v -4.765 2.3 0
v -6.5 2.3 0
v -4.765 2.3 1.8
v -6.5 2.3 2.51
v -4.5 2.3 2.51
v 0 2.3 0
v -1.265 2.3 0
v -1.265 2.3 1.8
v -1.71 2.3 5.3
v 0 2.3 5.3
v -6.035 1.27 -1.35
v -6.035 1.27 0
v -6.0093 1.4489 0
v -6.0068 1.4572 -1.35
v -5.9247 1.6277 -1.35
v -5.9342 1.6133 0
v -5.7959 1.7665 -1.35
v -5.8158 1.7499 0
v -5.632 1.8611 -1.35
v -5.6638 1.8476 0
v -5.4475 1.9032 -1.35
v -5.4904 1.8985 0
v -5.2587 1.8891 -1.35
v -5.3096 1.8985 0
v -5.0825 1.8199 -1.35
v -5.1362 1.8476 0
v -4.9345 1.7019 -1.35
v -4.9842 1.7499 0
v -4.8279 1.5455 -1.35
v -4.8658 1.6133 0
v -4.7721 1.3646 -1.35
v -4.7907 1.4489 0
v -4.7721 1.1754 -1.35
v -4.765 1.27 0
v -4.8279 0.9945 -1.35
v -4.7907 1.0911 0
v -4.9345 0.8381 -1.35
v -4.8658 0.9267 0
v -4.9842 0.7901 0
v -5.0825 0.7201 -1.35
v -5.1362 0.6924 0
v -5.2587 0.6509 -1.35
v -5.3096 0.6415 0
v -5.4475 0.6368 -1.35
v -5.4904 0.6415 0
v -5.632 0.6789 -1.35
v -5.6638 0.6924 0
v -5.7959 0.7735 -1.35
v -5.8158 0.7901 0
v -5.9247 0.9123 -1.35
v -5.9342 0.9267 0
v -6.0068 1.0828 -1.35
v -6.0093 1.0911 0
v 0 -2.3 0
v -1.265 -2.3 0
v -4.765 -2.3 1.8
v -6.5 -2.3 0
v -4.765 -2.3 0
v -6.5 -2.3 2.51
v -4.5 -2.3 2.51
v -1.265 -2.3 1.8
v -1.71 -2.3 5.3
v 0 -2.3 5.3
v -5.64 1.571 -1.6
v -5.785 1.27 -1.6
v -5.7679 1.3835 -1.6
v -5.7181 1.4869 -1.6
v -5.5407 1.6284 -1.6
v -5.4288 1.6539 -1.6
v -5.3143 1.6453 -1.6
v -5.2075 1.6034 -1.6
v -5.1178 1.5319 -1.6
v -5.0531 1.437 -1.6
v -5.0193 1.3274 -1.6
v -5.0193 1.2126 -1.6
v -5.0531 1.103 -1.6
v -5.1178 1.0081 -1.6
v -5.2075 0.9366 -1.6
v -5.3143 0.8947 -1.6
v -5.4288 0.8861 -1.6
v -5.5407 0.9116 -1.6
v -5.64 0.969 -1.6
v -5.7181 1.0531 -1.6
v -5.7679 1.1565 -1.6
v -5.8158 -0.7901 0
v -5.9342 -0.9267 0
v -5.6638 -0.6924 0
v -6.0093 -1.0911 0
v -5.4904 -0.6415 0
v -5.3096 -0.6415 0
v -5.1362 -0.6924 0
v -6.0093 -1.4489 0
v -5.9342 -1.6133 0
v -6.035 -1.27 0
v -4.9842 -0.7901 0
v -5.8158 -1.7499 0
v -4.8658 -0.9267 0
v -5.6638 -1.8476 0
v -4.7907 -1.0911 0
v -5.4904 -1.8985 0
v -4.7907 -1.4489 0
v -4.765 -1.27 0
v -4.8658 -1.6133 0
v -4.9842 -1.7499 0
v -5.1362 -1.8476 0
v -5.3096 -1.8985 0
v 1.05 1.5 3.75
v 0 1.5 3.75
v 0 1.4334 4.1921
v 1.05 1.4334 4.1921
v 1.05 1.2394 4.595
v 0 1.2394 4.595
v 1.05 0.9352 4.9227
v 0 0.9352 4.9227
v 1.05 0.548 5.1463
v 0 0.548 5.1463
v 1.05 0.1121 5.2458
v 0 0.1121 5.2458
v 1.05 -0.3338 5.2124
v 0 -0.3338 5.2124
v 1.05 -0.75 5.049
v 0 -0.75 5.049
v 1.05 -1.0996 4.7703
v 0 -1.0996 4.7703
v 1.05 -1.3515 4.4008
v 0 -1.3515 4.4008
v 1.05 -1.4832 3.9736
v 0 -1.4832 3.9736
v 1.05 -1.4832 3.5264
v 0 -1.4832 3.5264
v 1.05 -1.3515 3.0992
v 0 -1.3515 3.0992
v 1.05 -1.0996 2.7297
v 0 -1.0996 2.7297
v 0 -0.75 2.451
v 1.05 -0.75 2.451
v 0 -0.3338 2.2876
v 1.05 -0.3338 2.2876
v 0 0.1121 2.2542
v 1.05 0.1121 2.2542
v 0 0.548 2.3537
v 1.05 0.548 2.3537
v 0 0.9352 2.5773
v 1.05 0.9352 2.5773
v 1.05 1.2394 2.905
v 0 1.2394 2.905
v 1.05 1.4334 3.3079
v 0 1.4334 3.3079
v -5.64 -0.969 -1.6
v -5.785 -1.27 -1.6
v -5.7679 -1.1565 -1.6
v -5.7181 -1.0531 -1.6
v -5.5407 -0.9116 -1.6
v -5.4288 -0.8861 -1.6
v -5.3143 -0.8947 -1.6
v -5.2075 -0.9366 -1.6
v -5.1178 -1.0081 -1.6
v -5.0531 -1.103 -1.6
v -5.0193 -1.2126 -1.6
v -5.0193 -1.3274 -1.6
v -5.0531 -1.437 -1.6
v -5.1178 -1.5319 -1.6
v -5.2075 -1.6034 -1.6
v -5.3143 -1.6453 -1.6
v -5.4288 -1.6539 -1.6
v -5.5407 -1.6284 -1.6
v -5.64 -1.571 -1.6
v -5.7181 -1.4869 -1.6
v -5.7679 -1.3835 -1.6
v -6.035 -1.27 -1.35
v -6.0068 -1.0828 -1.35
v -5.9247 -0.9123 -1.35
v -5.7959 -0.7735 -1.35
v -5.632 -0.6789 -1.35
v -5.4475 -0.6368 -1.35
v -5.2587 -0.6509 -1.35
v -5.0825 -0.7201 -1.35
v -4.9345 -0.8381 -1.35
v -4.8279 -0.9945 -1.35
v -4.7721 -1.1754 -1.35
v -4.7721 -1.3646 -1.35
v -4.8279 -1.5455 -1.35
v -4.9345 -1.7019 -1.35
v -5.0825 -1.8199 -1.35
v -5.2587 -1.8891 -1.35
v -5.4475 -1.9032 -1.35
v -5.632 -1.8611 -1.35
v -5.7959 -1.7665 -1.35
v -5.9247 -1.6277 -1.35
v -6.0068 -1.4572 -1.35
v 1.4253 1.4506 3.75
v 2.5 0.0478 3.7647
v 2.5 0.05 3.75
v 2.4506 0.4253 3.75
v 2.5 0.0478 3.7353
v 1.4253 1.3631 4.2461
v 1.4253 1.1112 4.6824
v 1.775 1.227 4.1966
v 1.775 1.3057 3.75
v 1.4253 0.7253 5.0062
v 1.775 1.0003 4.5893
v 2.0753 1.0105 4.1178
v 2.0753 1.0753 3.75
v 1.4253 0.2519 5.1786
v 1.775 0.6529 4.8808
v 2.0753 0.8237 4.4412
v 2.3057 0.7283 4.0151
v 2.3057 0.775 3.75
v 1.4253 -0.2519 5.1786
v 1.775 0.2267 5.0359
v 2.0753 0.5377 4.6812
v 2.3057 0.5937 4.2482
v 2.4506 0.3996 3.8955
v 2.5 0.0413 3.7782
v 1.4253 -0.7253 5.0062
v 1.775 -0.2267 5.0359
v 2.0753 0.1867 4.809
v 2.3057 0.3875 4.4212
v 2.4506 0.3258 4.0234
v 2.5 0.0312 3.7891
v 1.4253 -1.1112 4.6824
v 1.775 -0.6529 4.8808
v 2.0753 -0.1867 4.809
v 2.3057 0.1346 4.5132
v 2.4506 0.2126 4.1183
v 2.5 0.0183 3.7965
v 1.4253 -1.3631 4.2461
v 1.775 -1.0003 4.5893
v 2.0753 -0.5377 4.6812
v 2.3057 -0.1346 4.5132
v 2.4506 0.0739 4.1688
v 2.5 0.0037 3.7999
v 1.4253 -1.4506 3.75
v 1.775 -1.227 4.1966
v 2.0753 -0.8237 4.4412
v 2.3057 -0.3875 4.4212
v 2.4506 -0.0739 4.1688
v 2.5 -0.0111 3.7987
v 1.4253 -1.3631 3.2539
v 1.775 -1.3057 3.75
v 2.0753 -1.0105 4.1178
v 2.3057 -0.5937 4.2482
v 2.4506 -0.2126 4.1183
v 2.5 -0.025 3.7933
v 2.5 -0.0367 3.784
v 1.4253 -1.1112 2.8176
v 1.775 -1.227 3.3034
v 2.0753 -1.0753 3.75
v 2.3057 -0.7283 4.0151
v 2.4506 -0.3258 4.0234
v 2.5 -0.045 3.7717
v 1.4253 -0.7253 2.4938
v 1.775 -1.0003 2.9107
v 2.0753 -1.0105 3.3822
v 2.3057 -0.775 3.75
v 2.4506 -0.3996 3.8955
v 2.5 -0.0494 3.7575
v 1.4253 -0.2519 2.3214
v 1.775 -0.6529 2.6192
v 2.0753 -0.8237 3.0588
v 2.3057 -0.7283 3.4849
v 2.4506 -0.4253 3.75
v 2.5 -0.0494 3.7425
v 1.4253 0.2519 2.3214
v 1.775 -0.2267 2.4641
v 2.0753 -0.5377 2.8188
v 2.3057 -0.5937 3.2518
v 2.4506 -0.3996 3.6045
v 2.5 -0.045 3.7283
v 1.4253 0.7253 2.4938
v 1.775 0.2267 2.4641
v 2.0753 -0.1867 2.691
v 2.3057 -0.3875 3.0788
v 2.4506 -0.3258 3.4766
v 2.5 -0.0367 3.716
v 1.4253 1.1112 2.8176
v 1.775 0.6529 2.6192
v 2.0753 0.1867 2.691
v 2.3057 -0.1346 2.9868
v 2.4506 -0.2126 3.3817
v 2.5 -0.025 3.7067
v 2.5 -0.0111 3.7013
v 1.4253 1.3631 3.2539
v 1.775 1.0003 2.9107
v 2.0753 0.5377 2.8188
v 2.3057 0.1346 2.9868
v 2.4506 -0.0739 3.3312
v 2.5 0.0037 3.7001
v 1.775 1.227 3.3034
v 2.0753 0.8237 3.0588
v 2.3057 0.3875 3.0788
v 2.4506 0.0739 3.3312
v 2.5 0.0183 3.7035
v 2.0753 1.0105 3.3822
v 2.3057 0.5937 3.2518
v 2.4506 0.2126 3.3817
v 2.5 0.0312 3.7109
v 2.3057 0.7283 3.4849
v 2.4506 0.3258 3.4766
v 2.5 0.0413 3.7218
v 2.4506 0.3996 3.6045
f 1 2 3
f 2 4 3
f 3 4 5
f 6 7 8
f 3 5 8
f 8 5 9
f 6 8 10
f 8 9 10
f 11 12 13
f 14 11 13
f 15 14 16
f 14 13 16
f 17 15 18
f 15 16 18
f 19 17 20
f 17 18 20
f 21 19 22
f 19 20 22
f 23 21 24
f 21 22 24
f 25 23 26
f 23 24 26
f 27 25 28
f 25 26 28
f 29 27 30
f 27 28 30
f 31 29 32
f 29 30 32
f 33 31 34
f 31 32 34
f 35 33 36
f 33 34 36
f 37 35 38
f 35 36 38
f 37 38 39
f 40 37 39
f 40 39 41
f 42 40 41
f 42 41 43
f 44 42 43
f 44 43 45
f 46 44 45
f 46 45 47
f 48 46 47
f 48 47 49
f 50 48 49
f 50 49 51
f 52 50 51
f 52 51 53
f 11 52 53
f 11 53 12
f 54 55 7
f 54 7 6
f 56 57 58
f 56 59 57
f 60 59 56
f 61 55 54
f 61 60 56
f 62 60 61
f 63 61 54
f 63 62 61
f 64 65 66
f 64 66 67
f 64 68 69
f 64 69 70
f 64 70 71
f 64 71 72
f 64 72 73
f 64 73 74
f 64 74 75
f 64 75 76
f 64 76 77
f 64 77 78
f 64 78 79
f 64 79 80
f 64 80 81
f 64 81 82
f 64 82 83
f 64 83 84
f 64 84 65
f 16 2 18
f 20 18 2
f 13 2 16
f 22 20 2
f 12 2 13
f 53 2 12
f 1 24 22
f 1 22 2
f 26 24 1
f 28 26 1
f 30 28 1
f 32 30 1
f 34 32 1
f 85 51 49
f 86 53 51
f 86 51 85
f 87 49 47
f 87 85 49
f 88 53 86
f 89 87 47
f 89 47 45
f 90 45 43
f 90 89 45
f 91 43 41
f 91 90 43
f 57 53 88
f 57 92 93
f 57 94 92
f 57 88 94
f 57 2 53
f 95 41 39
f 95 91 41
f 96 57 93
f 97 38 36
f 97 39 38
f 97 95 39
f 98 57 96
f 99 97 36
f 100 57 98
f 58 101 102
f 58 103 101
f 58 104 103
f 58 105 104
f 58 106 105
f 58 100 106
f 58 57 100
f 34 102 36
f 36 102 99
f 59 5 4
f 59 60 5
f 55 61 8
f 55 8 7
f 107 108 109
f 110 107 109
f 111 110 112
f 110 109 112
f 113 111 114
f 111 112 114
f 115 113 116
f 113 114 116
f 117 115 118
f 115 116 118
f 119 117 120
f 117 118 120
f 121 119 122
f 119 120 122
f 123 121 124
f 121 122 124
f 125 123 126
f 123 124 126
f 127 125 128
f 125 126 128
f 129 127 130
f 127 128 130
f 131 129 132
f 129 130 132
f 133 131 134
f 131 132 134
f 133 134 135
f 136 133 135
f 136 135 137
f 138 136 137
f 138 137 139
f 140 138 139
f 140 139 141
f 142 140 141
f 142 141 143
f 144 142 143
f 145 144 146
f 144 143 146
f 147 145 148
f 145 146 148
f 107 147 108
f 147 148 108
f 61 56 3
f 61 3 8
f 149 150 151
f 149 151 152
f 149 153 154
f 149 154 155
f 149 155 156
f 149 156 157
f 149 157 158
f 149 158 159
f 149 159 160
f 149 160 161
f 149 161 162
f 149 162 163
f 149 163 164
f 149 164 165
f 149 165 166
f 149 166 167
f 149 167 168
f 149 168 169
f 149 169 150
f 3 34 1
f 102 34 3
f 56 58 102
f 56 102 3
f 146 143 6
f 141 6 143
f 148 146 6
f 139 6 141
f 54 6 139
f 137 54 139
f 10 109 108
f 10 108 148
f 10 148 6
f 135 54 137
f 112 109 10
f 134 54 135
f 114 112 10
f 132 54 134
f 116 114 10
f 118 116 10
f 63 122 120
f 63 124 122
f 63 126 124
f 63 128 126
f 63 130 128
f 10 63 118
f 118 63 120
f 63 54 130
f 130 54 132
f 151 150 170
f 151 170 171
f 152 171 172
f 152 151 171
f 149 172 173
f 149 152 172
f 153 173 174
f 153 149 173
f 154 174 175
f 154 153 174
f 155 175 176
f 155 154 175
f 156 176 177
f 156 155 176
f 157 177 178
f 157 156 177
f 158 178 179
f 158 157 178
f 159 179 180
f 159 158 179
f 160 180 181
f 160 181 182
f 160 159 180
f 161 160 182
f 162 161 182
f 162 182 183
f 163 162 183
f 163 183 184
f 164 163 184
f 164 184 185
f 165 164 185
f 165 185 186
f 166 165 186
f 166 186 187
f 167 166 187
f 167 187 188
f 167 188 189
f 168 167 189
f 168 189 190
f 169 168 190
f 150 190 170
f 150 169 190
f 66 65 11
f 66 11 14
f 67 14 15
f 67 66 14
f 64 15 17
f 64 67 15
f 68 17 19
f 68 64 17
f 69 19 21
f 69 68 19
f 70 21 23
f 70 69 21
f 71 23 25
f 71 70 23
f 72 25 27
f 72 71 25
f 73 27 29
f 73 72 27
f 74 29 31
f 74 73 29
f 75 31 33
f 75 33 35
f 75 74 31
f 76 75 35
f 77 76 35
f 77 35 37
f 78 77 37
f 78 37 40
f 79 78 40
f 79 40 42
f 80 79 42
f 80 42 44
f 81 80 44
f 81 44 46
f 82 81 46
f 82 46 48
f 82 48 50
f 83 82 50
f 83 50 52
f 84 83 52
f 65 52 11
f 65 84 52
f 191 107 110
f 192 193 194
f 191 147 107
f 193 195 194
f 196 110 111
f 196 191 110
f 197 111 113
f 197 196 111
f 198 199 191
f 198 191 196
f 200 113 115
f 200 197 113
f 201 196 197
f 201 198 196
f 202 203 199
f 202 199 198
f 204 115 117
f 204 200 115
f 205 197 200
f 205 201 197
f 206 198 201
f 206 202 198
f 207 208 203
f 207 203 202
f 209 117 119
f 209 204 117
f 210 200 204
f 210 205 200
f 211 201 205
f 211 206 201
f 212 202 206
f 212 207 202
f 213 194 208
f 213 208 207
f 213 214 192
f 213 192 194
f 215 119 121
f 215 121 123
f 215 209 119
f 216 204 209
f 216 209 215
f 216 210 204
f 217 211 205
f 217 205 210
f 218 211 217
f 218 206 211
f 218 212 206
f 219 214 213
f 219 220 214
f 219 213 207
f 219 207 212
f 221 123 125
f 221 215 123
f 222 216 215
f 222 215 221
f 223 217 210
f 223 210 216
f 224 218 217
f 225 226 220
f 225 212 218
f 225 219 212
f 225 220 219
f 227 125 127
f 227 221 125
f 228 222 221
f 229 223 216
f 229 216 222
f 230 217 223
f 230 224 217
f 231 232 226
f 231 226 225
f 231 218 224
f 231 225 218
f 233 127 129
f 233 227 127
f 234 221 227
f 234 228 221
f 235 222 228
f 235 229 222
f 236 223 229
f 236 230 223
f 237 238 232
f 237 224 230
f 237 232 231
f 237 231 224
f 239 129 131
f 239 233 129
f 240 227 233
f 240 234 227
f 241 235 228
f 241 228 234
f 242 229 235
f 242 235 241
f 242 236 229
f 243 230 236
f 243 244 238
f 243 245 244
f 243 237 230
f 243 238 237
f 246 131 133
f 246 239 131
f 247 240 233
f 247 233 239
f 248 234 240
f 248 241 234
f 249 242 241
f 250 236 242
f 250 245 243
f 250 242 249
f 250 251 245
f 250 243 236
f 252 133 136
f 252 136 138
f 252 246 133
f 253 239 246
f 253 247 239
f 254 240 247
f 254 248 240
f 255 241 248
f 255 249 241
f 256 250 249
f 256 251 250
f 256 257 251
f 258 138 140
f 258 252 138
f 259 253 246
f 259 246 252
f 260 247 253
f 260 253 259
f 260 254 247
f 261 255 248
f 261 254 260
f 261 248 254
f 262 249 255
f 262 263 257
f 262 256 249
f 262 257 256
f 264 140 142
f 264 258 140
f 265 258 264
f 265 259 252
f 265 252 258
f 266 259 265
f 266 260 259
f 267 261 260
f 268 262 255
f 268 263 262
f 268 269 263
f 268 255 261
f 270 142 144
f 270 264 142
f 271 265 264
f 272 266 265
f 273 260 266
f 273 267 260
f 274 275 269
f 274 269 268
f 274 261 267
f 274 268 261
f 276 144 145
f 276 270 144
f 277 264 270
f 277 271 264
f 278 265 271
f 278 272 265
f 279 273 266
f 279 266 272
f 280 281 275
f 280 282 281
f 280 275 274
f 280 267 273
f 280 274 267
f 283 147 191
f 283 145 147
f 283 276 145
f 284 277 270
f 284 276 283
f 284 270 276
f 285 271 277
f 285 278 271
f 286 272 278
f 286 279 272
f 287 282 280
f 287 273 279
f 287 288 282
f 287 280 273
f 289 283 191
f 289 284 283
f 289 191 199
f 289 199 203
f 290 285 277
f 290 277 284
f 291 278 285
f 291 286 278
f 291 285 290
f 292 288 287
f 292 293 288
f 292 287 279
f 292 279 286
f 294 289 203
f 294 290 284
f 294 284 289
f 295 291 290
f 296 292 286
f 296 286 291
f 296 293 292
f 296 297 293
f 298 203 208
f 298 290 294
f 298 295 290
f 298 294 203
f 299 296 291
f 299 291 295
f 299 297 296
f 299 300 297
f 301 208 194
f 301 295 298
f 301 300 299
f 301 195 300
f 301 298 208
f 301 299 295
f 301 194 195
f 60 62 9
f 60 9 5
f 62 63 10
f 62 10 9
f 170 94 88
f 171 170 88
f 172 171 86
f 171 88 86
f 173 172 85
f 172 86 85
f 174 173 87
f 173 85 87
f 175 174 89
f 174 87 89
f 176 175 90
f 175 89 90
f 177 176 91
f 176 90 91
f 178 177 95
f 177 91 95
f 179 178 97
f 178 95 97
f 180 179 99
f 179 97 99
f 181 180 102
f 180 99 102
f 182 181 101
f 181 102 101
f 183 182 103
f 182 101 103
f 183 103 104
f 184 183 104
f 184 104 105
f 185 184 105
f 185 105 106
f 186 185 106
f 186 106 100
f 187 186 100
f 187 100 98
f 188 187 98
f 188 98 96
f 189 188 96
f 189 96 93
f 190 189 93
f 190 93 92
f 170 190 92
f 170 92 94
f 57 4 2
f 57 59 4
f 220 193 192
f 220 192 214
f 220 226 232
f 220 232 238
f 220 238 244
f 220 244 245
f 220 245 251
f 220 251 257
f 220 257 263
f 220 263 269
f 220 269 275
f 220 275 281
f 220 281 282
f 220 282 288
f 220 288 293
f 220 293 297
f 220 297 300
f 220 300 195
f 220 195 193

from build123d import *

# Parameters (mm, degrees)
PAD_DEPTH    = 2.3
SKETCH001_R  = 0.635
PAD001_DEPTH = 1.6
SKETCH002_R  = 1.5
PAD002_DEPTH = 2.5
FILLET_R     = 1.45
CHAMFER_SIZE = 0.25


with BuildPart() as part:
    # Sketch → Pad (new body, symmetric)
    with BuildSketch(Plane.XZ):
        Polygon((-6.5, 0), (-4.765, 0), (-4.765, 1.8), (-1.265, 1.8), (-1.265, 0), (0, 0), (0, 5.3), (-1.71, 5.3), (-4.5, 2.51), (-6.5, 2.51), align=None)
    extrude(amount=PAD_DEPTH, both=True)

    # Sketch001 → Pad001 (join)
    with BuildSketch(Plane(origin=(0, 0, 0), x_dir=(-1, 0, 0), z_dir=(0, 0, -1))):
        with Locations((5.4, 1.27)):
            Circle(SKETCH001_R)
        with Locations((5.4, -1.27)):
            Circle(SKETCH001_R)
    extrude(amount=PAD001_DEPTH)

    # Sketch002 → Pad002 (join)
    with BuildSketch(Plane.YZ):
        with Locations((0, 3.75)):
            Circle(SKETCH002_R)
    extrude(amount=PAD002_DEPTH)

    # Fillet
    fillet_edges = [part.edges().sort_by_distance(p)[0] for p in [
        (2.5, -1.5, 3.75),
    ]]
    fillet(fillet_edges, radius=FILLET_R)

    # Chamfer
    chamfer_edges = [part.edges().sort_by_distance(p)[0] for p in [
        (-4.765, 1.27, -1.6),
        (-4.765, -1.27, -1.6),
    ]]
    chamfer(chamfer_edges, length=CHAMFER_SIZE)


solid = part.part
